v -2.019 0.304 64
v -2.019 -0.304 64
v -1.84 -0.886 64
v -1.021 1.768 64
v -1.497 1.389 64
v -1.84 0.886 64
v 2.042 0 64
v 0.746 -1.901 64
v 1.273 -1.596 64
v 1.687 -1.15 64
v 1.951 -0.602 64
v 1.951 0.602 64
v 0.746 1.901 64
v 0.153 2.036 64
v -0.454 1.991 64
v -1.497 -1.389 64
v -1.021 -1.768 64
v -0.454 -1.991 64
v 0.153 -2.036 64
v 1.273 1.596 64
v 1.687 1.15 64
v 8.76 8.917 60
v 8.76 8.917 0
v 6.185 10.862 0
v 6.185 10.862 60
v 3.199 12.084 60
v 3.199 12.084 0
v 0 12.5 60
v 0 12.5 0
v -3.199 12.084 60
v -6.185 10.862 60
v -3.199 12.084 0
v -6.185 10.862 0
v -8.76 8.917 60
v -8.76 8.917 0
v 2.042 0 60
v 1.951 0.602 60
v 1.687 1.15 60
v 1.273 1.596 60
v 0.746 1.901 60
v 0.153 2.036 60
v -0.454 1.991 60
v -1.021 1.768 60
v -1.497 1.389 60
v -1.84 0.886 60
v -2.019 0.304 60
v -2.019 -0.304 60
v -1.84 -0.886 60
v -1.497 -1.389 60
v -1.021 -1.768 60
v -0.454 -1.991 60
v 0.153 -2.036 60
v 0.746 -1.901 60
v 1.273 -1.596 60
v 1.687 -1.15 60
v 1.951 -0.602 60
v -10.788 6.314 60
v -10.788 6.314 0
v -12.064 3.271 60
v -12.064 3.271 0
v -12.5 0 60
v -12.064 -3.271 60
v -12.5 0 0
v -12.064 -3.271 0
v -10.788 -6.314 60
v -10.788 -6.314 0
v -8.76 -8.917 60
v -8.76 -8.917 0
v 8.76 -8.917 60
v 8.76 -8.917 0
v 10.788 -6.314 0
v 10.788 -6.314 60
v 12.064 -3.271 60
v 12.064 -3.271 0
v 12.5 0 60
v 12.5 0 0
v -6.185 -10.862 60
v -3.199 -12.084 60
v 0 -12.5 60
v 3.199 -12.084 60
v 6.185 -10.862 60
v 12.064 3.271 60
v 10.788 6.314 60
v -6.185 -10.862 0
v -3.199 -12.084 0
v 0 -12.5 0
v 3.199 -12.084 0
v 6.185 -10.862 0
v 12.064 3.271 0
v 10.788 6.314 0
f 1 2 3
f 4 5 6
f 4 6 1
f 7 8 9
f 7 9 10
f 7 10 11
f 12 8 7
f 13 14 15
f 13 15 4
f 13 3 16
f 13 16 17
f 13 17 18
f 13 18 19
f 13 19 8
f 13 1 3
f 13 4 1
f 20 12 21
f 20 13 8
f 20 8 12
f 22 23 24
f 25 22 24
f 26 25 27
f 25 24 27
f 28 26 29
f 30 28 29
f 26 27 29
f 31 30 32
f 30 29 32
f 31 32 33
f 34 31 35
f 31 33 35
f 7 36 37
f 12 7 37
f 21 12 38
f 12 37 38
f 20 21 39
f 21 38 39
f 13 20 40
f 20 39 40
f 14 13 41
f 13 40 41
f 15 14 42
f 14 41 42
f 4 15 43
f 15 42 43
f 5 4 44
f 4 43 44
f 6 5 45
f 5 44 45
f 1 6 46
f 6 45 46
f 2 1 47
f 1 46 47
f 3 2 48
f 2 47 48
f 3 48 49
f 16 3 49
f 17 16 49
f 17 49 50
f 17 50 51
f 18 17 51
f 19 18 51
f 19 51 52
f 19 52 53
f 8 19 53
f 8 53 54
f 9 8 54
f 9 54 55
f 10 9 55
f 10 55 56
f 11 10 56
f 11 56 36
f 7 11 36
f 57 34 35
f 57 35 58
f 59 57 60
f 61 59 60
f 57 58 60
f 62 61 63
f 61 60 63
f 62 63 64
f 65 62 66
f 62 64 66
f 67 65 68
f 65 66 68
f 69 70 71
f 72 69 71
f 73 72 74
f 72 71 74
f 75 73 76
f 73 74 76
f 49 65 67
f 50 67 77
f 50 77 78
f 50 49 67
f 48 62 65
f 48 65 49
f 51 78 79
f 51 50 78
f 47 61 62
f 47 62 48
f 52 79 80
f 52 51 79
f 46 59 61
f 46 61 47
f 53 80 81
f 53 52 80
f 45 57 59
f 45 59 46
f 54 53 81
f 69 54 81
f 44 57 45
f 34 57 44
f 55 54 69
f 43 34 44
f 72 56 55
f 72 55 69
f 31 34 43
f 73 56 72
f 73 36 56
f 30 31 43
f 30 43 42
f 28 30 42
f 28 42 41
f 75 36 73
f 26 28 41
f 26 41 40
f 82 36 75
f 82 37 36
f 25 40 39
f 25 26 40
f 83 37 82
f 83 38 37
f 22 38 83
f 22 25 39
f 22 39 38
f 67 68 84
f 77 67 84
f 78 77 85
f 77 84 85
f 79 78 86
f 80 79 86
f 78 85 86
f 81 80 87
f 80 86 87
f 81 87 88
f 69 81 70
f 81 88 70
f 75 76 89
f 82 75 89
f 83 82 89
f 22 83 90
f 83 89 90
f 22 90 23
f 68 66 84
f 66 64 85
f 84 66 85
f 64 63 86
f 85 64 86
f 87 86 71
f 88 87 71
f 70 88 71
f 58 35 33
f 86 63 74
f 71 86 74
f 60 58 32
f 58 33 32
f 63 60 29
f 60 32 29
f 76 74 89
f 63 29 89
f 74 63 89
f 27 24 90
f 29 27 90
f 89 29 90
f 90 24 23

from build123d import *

# Parameters (mm, degrees)
F0_W     = 17.519105383
F0_H     = 17.8348239851
F0_R     = 2.0418919941
F1_DEPTH = 60
F2_DEPTH = 64


with BuildPart() as f1:
    # F0 (on Top) → F1 (new body)
    with BuildSketch(Plane.XY):
        with BuildLine():
            Line((-8.7595526915, 8.9174119926), (8.7595526915, 8.9174119926))
            ThreePointArc((8.7595526915, 8.9174119926), (0, 12.5), (-8.7595526915, 8.9174119926))
        make_face()
        with BuildLine():
            Line((-8.7595526915, -8.9174119926), (-8.7595526915, 8.9174119926))
            ThreePointArc((-8.7595526915, 8.9174119926), (-12.5, 0), (-8.7595526915, -8.9174119926))
        make_face()
        with BuildLine():
            ThreePointArc((-8.7595526915, -8.9174119926), (0, -12.5), (8.7595526915, -8.9174119926))
            Line((8.7595526915, -8.9174119926), (-8.7595526915, -8.9174119926))
        make_face()
        with BuildLine():
            ThreePointArc((8.7595526915, -8.9174119926), (11.5270206177, -4.835059015), (12.5, 0))
            ThreePointArc((12.5, 0), (11.5270206177, 4.835059015), (8.7595526915, 8.9174119926))
            Line((8.7595526915, 8.9174119926), (8.7595526915, -8.9174119926))
        make_face()
        Rectangle(F0_W, F0_H)
        Circle(F0_R, mode=Mode.SUBTRACT)
    extrude(amount=F1_DEPTH)

    # F0 (on Top) → F2 (join)
    with BuildSketch(Plane.XY):
        Circle(F0_R)
    extrude(amount=F2_DEPTH)


solid = f1.part
